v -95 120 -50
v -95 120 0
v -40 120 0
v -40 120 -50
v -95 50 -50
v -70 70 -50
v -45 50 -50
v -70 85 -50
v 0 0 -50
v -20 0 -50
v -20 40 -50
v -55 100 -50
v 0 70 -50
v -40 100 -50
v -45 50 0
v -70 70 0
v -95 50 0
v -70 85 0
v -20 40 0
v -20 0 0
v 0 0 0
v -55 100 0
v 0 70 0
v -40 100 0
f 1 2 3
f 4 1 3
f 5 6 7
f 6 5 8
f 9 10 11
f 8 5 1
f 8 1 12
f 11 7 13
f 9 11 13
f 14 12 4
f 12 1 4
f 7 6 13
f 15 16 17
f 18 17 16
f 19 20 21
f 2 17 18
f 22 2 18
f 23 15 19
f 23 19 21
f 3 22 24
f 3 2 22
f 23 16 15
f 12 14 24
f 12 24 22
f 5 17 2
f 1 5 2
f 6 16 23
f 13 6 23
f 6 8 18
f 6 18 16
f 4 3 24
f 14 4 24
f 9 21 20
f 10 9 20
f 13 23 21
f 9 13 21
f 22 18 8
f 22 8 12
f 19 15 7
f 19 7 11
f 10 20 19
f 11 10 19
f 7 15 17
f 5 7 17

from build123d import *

# Parameters (mm, degrees)
BOSS_EXTRU_1_DEPTH = 50
BOSS_EXTRU_2_DEPTH = 50
BOSS_EXTRU_3_DEPTH = 50


with BuildPart() as part:
    # Esquisse1 → Boss.-Extru.1 (new body)
    with BuildSketch(Plane.XY):
        Polygon((-40, 100), (-70, 100), (-70, 70), (0, 70), (0, 0), (-20, 0), (-20, 50), (-95, 50), (-95, 120), (-40, 120), align=None)
    extrude(amount=-BOSS_EXTRU_1_DEPTH)

    # Esquisse3 → Boss.-Extru.2 (add)
    with BuildSketch(Plane.XY):
        Polygon((-45, 50), (-20, 40), (-20, 50), align=None)
    extrude(amount=-BOSS_EXTRU_2_DEPTH)

    # Esquisse3<4> → Boss.-Extru.3 (add)
    with BuildSketch(Plane.XY):
        Polygon((-70, 100), (-70, 85), (-55, 100), align=None)
    extrude(amount=-BOSS_EXTRU_3_DEPTH)


solid = part.part
